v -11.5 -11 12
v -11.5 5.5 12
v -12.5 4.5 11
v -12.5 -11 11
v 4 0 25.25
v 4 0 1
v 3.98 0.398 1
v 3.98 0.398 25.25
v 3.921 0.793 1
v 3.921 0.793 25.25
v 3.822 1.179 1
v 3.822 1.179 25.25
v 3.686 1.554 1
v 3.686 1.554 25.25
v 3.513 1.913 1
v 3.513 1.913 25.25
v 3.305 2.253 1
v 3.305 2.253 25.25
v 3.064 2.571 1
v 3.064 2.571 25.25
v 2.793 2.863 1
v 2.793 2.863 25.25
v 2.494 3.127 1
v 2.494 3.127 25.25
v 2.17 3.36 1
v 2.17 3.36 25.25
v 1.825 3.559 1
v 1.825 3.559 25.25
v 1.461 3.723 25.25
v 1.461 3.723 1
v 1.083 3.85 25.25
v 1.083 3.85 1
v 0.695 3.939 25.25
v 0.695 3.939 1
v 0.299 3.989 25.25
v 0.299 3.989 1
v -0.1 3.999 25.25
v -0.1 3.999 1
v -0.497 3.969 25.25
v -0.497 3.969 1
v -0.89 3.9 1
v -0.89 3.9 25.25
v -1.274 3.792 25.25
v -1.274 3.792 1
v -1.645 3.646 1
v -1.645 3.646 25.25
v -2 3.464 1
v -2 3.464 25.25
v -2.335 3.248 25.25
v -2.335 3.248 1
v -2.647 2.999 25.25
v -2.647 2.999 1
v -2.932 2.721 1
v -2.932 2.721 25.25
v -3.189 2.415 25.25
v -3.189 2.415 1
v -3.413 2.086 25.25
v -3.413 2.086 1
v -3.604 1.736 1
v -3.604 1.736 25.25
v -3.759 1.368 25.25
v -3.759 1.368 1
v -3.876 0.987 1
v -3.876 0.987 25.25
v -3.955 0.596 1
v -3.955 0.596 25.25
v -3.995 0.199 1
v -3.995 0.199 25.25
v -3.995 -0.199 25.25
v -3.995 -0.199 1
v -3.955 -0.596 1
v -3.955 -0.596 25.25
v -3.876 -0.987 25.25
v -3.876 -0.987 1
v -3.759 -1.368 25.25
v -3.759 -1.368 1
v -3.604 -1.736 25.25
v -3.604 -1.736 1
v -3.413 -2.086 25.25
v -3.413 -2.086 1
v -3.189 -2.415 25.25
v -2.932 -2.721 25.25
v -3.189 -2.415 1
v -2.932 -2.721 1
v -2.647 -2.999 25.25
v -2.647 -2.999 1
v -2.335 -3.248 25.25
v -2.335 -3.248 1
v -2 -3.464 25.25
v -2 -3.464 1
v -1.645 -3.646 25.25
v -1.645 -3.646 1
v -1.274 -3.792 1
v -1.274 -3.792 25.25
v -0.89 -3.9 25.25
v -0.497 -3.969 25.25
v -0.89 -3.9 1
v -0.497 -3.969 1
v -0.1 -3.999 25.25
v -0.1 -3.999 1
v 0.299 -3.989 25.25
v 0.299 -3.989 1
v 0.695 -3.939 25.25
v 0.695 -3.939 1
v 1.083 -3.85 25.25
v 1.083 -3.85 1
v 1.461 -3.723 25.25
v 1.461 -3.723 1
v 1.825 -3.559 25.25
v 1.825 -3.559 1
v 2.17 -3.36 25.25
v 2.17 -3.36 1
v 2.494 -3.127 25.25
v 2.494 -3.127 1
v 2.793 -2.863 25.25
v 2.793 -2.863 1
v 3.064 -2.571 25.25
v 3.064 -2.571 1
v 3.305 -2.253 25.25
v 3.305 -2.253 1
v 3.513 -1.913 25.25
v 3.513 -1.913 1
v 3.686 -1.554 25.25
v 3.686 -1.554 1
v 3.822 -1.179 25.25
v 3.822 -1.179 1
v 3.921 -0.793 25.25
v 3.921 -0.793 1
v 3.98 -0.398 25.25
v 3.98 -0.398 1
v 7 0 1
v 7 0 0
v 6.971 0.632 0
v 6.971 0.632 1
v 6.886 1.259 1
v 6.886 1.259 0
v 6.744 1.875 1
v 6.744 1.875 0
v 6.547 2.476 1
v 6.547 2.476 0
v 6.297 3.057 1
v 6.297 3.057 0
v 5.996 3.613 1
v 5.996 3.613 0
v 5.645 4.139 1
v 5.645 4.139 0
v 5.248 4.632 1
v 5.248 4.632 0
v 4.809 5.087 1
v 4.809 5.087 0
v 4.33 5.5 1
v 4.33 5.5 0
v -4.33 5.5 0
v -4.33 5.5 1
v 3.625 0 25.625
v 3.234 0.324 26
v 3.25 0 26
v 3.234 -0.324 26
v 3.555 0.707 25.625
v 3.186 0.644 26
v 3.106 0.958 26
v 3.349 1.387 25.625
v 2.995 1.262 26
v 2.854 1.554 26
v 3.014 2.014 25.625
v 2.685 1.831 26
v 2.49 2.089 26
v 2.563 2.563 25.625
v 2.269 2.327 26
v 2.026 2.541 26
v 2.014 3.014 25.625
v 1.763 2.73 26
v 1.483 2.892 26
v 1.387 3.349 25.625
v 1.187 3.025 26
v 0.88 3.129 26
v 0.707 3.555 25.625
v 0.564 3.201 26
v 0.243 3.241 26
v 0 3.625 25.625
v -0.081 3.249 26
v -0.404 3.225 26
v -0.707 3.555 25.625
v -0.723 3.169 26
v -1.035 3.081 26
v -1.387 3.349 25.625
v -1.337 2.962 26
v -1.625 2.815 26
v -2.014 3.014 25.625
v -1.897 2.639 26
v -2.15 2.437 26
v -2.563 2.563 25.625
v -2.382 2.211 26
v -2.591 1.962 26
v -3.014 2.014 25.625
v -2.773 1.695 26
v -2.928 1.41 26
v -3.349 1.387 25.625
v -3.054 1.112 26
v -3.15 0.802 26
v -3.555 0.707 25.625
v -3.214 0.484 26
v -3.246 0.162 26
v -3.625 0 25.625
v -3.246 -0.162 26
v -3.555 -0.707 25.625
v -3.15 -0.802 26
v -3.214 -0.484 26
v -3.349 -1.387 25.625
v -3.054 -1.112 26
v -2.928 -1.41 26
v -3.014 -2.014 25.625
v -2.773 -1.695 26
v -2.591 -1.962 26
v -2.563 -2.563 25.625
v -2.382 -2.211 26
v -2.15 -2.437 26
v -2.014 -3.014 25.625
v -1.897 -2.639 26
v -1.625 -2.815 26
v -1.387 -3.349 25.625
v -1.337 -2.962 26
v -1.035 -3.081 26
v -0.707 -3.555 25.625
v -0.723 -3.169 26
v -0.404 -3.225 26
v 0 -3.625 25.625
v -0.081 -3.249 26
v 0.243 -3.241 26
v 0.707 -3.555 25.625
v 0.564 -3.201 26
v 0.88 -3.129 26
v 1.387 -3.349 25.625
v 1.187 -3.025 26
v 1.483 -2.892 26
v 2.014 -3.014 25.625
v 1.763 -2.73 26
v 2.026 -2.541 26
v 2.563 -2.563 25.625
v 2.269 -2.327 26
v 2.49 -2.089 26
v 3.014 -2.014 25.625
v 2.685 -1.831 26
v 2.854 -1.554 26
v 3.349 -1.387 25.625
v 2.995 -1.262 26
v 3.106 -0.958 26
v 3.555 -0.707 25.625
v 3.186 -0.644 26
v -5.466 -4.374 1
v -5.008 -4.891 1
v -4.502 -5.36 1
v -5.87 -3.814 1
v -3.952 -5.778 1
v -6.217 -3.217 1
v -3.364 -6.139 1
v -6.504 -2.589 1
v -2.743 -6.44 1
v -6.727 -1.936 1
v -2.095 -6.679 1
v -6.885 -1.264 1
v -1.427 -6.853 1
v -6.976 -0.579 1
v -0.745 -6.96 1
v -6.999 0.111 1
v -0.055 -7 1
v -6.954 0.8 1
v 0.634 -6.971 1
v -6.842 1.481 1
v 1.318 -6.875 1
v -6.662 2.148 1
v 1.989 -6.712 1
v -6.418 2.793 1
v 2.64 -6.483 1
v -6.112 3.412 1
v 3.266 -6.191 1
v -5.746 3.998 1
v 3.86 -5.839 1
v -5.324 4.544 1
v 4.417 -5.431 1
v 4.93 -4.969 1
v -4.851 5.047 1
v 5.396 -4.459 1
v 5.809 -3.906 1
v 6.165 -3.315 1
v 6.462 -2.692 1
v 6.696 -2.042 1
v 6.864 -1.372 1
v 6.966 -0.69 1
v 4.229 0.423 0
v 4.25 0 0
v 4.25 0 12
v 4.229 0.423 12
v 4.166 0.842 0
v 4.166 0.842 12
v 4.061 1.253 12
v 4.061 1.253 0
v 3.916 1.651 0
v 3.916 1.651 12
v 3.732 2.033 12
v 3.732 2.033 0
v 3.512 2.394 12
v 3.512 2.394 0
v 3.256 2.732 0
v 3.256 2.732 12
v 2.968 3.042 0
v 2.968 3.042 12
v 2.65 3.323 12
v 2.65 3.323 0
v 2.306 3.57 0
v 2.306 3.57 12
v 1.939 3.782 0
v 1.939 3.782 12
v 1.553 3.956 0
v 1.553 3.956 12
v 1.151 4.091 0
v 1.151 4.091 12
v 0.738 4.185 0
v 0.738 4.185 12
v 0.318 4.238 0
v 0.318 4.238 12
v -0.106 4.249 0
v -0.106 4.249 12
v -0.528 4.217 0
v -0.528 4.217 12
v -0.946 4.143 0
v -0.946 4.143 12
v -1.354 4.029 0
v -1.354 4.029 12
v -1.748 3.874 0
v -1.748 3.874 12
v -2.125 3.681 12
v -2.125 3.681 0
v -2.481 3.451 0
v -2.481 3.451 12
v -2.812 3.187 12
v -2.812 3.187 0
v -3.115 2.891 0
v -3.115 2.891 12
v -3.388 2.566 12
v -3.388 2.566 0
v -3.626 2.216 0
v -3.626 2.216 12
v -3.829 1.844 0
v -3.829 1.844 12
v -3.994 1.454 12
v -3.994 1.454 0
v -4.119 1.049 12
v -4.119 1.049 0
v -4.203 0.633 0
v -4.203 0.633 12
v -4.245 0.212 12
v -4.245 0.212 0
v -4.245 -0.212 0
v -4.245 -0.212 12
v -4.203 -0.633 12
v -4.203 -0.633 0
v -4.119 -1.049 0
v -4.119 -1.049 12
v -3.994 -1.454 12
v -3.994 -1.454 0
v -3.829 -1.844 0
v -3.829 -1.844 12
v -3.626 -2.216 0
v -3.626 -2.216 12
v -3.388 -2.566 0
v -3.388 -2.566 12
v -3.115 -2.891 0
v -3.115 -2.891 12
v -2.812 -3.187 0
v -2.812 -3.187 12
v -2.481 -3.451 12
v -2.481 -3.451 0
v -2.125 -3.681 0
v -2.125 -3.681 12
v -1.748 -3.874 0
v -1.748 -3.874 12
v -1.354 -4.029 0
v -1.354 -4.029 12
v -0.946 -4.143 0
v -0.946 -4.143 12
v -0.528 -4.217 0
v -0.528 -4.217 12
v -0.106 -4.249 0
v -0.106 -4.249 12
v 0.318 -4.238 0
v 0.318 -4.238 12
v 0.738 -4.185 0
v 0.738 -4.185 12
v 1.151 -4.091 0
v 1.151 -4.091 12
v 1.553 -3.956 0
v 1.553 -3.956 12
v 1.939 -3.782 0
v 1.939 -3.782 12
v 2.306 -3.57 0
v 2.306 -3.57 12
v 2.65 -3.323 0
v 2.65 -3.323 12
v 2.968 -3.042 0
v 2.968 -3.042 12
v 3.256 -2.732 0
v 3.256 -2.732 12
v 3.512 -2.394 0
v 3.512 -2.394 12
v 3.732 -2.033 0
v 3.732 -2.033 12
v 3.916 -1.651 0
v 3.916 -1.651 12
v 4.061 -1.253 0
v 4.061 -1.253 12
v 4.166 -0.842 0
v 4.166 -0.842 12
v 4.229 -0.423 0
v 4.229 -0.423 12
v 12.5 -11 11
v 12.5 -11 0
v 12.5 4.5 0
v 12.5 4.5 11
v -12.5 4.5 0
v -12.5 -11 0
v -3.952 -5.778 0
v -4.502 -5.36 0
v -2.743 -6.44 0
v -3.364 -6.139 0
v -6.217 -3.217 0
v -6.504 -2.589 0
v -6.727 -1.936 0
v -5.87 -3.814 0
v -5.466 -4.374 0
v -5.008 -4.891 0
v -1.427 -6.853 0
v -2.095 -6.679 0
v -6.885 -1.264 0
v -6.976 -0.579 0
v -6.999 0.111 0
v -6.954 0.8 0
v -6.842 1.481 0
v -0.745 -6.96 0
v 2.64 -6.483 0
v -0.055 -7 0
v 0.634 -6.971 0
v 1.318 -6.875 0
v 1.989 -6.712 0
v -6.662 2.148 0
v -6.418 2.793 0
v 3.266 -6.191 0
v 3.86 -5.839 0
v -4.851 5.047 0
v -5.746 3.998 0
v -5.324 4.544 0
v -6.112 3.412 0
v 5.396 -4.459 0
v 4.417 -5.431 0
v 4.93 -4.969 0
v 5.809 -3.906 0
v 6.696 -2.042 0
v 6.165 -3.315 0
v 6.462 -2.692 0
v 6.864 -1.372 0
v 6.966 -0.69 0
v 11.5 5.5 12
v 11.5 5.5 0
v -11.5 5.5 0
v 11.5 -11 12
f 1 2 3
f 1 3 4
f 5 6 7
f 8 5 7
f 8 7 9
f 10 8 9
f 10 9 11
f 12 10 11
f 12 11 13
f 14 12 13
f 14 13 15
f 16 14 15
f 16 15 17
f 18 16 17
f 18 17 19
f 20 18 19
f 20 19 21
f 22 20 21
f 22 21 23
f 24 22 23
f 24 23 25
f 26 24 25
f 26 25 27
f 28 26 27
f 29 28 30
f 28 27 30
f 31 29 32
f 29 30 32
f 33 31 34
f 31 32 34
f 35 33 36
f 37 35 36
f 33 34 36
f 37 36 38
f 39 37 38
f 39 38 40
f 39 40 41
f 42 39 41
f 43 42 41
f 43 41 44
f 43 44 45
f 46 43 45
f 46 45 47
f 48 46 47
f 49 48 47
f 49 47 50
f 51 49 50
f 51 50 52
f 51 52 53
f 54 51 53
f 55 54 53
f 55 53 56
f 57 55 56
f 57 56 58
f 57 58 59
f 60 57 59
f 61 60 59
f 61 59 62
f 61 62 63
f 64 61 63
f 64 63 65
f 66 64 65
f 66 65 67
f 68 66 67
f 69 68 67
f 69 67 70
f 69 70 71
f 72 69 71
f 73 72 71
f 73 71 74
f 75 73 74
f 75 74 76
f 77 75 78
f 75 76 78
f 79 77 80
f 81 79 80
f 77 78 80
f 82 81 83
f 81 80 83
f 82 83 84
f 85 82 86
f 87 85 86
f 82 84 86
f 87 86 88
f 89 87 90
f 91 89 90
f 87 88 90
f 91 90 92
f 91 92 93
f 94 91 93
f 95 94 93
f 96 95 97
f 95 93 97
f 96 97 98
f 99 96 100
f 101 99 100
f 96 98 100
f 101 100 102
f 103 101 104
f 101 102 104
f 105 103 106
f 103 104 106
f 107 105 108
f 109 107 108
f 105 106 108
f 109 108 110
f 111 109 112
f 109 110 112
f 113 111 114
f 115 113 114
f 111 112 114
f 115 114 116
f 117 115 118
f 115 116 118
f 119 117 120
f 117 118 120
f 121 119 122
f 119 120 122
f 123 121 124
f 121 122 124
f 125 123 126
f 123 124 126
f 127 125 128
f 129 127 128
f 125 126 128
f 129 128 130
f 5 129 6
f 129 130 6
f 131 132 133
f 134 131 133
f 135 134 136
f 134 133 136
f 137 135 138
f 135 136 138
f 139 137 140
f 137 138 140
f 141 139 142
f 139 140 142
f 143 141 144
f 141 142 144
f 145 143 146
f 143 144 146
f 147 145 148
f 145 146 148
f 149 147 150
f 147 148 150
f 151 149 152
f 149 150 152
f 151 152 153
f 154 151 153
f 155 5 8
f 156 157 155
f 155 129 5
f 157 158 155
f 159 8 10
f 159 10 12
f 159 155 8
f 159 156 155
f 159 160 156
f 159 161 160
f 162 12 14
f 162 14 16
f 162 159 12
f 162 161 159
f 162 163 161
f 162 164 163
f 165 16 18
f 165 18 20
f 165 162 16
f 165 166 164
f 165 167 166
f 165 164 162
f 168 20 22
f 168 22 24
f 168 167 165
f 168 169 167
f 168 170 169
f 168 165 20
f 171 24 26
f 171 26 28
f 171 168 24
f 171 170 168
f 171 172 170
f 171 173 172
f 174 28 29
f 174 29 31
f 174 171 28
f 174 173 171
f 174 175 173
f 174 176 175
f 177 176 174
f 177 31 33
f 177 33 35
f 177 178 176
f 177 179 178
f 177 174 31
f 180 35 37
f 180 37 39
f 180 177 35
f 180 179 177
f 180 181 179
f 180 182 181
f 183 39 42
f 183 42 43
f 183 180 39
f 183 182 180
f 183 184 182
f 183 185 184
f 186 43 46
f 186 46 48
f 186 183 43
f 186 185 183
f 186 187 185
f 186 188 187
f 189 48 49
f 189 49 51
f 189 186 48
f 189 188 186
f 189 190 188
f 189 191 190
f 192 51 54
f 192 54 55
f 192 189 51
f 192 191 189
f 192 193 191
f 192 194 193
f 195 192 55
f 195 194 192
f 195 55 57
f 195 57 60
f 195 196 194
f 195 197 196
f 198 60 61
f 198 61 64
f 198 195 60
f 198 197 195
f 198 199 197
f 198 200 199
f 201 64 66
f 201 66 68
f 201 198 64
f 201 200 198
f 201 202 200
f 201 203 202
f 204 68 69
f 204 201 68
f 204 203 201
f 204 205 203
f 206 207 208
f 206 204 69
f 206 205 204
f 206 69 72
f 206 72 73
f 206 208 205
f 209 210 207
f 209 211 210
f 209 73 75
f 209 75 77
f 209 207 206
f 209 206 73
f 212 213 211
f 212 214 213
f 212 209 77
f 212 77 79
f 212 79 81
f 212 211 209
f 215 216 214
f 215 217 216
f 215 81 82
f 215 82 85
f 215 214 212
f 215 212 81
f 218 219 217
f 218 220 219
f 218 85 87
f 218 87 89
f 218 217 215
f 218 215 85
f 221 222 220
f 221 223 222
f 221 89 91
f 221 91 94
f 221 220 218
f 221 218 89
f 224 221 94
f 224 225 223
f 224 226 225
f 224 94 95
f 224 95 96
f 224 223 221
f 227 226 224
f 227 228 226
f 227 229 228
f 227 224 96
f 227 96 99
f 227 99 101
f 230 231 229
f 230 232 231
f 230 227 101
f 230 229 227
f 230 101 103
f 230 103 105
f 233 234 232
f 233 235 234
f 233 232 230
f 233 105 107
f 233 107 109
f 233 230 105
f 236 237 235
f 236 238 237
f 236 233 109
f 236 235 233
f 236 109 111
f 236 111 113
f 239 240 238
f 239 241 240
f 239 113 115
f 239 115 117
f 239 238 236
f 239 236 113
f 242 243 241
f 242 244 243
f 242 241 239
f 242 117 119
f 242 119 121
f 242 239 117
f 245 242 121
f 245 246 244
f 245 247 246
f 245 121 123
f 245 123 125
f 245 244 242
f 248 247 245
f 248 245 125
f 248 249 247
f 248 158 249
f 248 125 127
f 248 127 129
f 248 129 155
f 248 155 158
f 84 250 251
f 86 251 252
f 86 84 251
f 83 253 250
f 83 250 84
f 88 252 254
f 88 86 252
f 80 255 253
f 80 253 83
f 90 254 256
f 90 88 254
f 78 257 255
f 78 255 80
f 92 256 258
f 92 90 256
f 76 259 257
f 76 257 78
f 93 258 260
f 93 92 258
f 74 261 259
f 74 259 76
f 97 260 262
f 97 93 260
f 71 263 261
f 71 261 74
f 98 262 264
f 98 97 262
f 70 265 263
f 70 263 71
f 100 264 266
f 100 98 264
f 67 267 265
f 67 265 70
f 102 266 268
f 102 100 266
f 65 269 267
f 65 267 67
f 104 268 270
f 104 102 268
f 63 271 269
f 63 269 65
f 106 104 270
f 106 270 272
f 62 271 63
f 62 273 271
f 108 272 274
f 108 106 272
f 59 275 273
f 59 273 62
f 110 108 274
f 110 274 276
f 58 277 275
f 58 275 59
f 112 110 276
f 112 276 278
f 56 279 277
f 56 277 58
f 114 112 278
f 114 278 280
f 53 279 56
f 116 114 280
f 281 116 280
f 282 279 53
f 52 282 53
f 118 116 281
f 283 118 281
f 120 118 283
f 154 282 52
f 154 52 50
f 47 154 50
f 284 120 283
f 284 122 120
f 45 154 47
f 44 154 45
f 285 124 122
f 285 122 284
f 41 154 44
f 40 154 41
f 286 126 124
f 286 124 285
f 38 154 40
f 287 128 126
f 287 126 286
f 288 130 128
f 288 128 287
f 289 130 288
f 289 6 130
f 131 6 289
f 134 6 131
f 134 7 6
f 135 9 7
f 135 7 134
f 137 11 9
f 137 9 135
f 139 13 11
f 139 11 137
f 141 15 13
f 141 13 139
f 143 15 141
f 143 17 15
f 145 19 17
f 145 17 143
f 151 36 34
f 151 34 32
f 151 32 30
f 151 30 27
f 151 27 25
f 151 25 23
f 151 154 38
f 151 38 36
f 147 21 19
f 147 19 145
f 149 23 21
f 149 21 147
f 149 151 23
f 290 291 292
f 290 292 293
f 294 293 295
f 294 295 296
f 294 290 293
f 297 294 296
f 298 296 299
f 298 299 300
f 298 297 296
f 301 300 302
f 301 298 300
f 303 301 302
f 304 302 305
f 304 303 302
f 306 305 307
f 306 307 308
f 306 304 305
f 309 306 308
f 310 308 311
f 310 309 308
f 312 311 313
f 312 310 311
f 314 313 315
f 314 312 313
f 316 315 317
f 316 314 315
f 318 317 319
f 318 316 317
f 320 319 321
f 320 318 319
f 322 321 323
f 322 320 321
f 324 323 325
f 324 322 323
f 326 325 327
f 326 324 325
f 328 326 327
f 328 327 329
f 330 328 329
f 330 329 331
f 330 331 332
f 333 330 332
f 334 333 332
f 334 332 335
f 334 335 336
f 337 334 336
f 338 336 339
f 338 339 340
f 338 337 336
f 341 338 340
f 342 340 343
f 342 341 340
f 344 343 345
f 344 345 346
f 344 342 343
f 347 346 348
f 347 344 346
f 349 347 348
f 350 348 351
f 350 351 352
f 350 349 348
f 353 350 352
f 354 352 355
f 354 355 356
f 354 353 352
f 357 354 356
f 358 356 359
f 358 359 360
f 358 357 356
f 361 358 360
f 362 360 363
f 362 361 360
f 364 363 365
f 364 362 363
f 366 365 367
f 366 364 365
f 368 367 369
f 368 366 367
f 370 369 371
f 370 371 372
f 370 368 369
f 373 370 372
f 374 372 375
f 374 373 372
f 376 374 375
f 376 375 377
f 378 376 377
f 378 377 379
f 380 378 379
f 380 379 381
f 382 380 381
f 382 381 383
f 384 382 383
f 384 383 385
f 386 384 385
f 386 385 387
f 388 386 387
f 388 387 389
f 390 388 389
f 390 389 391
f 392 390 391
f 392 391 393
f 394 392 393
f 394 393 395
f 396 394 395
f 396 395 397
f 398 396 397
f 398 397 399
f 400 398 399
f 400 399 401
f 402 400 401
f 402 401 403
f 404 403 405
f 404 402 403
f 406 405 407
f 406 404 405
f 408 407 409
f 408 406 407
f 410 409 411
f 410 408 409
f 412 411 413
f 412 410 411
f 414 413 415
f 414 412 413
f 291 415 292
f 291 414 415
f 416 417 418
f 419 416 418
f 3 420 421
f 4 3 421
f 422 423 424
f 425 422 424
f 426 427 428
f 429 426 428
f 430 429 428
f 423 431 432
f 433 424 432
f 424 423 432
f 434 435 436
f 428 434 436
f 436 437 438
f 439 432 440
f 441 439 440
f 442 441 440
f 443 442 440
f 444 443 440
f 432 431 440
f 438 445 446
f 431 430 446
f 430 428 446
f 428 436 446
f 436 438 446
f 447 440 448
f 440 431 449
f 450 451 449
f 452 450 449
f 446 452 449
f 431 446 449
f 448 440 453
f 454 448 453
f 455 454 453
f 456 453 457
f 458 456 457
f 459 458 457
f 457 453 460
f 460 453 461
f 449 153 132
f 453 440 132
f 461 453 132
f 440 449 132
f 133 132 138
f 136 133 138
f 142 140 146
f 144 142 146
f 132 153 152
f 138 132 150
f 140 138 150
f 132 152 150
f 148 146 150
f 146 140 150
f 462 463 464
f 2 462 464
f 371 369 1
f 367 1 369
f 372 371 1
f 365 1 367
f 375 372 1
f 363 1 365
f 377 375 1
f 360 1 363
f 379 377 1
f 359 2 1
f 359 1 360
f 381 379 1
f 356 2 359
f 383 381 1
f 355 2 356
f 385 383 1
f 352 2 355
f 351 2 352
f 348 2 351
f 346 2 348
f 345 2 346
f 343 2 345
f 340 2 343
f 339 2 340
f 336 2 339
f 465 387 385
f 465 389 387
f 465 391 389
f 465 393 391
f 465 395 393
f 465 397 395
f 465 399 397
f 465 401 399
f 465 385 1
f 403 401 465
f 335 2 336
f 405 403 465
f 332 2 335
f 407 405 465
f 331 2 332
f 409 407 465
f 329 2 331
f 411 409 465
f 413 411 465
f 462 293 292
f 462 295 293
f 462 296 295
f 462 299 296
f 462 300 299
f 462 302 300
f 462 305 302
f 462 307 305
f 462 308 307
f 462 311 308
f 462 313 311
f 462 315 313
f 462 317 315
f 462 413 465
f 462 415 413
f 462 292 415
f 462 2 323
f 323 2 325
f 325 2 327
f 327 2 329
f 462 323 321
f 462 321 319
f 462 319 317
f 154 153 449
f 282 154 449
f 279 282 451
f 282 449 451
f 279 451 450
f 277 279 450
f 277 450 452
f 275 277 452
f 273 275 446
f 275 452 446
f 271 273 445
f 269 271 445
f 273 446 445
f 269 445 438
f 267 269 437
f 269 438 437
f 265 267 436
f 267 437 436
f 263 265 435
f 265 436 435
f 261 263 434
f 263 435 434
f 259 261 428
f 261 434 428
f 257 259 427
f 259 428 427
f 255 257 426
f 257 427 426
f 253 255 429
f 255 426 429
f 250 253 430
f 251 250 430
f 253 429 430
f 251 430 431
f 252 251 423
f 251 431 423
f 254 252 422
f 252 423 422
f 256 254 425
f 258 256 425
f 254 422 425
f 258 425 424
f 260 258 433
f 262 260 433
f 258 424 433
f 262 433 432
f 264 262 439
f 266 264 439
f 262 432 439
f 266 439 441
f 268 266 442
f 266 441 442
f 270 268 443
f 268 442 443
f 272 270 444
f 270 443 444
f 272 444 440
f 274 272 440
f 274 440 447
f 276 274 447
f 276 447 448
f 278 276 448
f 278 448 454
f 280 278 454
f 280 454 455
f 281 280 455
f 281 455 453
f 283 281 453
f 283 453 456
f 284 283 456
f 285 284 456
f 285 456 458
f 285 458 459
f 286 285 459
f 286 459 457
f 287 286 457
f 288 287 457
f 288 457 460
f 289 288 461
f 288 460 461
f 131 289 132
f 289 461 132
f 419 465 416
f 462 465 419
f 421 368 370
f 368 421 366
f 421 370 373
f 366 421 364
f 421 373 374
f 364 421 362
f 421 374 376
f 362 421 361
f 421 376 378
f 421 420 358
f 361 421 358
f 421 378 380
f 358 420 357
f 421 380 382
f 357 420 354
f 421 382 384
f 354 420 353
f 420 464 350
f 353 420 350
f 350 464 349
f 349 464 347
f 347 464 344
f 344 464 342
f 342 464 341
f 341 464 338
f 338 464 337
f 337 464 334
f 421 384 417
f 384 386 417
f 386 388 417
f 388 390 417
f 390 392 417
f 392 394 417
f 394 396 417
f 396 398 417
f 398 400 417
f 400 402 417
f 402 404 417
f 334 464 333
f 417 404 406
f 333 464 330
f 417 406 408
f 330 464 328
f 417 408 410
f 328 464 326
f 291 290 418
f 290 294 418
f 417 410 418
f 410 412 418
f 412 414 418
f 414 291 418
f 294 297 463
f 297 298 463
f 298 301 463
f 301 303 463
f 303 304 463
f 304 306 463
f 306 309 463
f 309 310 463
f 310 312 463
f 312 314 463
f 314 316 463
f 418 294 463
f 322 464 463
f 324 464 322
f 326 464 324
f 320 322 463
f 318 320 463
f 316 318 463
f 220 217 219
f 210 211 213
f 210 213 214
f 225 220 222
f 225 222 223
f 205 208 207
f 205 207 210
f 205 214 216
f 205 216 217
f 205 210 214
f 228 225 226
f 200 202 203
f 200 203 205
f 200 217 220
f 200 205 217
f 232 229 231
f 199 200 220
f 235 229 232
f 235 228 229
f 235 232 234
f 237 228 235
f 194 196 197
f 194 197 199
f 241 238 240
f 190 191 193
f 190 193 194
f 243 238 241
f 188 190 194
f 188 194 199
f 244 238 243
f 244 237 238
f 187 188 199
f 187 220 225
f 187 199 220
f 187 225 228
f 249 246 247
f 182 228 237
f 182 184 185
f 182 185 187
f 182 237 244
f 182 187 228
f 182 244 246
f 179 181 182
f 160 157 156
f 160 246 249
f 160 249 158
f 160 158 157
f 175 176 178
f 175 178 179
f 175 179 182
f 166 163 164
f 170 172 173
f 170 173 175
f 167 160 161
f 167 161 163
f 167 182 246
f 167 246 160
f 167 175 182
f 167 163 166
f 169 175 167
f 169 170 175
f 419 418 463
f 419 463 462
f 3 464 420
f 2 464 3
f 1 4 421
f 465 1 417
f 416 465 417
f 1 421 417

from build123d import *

# Parameters (mm, degrees)
F0_R     = 4
F1_DEPTH = 26
F0_R_2   = 4.25
F2_DEPTH = 1
F3_DEPTH = 12
F4_SIZE  = 0.75
F5_SIZE  = 1


with BuildPart() as f1:
    # F0 (on Top) → F1 (new body)
    with BuildSketch(Plane.XY):
        Circle(F0_R)
    extrude(amount=F1_DEPTH)

    # F0 (on Top) → F2 (join)
    with BuildSketch(Plane.XY):
        with BuildLine():
            Line((4.3301270189, 5.5), (-4.3301270189, 5.5))
            ThreePointArc((-4.3301270189, 5.5), (-3.0568865589, -6.2972569081), (7, 0))
            ThreePointArc((7, 0), (6.2972569081, 3.0568865589), (4.3301270189, 5.5))
        make_face()
        Circle(F0_R_2, mode=Mode.SUBTRACT)
        Circle(F0_R_2)
        Circle(F0_R, mode=Mode.SUBTRACT)
        Circle(F0_R)
    extrude(amount=F2_DEPTH)

    # F4
    f4_edges = [f1.edges().sort_by_distance(p)[0] for p in [
        (-4, 0, 26),
    ]]
    chamfer(f4_edges, length=F4_SIZE)


with BuildPart() as f3:
    # F0 (on Top) → F3 (new body)
    with BuildSketch(Plane.XY):
        with BuildLine():
            Line((-5.0990195136, 5.5), (-12.5, 5.5))
            Line((-12.5, 5.5), (-12.5, -11))
            Line((-12.5, -11), (12.5, -11))
            Line((12.5, -11), (12.5, 5.5))
            Line((12.5, 5.5), (5.0990195136, 5.5))
            ThreePointArc((5.0990195136, 5.5), (6.8735960876, 3.0006127414), (7.5, 0))
            ThreePointArc((7.5, 0), (-3.0006127414, -6.8735960876), (-5.0990195136, 5.5))
        make_face()
        with BuildLine():
            Line((-4.3301270189, 5.5), (-5.0990195136, 5.5))
            ThreePointArc((-5.0990195136, 5.5), (-3.0006127414, -6.8735960876), (7.5, 0))
            ThreePointArc((7.5, 0), (6.8735960876, 3.0006127414), (5.0990195136, 5.5))
            Line((5.0990195136, 5.5), (4.3301270189, 5.5))
            ThreePointArc((4.3301270189, 5.5), (6.2972569081, 3.0568865589), (7, 0))
            ThreePointArc((7, 0), (-3.0568865589, -6.2972569081), (-4.3301270189, 5.5))
        make_face()
        with BuildLine():
            Line((4.3301270189, 5.5), (-4.3301270189, 5.5))
            ThreePointArc((-4.3301270189, 5.5), (-3.0568865589, -6.2972569081), (7, 0))
            ThreePointArc((7, 0), (6.2972569081, 3.0568865589), (4.3301270189, 5.5))
        make_face()
        Circle(F0_R_2, mode=Mode.SUBTRACT)
    extrude(amount=F3_DEPTH)

    # F5
    f5_edges = [f3.edges().sort_by_distance(p)[0] for p in [
        (12.5, -2.75, 12),
        (-12.5, -2.75, 12),
        (12.5, 5.5, 6),
        (-12.5, 5.5, 6),
    ]]
    chamfer(f5_edges, length=F5_SIZE)


solid = Compound([f1.part, f3.part])
